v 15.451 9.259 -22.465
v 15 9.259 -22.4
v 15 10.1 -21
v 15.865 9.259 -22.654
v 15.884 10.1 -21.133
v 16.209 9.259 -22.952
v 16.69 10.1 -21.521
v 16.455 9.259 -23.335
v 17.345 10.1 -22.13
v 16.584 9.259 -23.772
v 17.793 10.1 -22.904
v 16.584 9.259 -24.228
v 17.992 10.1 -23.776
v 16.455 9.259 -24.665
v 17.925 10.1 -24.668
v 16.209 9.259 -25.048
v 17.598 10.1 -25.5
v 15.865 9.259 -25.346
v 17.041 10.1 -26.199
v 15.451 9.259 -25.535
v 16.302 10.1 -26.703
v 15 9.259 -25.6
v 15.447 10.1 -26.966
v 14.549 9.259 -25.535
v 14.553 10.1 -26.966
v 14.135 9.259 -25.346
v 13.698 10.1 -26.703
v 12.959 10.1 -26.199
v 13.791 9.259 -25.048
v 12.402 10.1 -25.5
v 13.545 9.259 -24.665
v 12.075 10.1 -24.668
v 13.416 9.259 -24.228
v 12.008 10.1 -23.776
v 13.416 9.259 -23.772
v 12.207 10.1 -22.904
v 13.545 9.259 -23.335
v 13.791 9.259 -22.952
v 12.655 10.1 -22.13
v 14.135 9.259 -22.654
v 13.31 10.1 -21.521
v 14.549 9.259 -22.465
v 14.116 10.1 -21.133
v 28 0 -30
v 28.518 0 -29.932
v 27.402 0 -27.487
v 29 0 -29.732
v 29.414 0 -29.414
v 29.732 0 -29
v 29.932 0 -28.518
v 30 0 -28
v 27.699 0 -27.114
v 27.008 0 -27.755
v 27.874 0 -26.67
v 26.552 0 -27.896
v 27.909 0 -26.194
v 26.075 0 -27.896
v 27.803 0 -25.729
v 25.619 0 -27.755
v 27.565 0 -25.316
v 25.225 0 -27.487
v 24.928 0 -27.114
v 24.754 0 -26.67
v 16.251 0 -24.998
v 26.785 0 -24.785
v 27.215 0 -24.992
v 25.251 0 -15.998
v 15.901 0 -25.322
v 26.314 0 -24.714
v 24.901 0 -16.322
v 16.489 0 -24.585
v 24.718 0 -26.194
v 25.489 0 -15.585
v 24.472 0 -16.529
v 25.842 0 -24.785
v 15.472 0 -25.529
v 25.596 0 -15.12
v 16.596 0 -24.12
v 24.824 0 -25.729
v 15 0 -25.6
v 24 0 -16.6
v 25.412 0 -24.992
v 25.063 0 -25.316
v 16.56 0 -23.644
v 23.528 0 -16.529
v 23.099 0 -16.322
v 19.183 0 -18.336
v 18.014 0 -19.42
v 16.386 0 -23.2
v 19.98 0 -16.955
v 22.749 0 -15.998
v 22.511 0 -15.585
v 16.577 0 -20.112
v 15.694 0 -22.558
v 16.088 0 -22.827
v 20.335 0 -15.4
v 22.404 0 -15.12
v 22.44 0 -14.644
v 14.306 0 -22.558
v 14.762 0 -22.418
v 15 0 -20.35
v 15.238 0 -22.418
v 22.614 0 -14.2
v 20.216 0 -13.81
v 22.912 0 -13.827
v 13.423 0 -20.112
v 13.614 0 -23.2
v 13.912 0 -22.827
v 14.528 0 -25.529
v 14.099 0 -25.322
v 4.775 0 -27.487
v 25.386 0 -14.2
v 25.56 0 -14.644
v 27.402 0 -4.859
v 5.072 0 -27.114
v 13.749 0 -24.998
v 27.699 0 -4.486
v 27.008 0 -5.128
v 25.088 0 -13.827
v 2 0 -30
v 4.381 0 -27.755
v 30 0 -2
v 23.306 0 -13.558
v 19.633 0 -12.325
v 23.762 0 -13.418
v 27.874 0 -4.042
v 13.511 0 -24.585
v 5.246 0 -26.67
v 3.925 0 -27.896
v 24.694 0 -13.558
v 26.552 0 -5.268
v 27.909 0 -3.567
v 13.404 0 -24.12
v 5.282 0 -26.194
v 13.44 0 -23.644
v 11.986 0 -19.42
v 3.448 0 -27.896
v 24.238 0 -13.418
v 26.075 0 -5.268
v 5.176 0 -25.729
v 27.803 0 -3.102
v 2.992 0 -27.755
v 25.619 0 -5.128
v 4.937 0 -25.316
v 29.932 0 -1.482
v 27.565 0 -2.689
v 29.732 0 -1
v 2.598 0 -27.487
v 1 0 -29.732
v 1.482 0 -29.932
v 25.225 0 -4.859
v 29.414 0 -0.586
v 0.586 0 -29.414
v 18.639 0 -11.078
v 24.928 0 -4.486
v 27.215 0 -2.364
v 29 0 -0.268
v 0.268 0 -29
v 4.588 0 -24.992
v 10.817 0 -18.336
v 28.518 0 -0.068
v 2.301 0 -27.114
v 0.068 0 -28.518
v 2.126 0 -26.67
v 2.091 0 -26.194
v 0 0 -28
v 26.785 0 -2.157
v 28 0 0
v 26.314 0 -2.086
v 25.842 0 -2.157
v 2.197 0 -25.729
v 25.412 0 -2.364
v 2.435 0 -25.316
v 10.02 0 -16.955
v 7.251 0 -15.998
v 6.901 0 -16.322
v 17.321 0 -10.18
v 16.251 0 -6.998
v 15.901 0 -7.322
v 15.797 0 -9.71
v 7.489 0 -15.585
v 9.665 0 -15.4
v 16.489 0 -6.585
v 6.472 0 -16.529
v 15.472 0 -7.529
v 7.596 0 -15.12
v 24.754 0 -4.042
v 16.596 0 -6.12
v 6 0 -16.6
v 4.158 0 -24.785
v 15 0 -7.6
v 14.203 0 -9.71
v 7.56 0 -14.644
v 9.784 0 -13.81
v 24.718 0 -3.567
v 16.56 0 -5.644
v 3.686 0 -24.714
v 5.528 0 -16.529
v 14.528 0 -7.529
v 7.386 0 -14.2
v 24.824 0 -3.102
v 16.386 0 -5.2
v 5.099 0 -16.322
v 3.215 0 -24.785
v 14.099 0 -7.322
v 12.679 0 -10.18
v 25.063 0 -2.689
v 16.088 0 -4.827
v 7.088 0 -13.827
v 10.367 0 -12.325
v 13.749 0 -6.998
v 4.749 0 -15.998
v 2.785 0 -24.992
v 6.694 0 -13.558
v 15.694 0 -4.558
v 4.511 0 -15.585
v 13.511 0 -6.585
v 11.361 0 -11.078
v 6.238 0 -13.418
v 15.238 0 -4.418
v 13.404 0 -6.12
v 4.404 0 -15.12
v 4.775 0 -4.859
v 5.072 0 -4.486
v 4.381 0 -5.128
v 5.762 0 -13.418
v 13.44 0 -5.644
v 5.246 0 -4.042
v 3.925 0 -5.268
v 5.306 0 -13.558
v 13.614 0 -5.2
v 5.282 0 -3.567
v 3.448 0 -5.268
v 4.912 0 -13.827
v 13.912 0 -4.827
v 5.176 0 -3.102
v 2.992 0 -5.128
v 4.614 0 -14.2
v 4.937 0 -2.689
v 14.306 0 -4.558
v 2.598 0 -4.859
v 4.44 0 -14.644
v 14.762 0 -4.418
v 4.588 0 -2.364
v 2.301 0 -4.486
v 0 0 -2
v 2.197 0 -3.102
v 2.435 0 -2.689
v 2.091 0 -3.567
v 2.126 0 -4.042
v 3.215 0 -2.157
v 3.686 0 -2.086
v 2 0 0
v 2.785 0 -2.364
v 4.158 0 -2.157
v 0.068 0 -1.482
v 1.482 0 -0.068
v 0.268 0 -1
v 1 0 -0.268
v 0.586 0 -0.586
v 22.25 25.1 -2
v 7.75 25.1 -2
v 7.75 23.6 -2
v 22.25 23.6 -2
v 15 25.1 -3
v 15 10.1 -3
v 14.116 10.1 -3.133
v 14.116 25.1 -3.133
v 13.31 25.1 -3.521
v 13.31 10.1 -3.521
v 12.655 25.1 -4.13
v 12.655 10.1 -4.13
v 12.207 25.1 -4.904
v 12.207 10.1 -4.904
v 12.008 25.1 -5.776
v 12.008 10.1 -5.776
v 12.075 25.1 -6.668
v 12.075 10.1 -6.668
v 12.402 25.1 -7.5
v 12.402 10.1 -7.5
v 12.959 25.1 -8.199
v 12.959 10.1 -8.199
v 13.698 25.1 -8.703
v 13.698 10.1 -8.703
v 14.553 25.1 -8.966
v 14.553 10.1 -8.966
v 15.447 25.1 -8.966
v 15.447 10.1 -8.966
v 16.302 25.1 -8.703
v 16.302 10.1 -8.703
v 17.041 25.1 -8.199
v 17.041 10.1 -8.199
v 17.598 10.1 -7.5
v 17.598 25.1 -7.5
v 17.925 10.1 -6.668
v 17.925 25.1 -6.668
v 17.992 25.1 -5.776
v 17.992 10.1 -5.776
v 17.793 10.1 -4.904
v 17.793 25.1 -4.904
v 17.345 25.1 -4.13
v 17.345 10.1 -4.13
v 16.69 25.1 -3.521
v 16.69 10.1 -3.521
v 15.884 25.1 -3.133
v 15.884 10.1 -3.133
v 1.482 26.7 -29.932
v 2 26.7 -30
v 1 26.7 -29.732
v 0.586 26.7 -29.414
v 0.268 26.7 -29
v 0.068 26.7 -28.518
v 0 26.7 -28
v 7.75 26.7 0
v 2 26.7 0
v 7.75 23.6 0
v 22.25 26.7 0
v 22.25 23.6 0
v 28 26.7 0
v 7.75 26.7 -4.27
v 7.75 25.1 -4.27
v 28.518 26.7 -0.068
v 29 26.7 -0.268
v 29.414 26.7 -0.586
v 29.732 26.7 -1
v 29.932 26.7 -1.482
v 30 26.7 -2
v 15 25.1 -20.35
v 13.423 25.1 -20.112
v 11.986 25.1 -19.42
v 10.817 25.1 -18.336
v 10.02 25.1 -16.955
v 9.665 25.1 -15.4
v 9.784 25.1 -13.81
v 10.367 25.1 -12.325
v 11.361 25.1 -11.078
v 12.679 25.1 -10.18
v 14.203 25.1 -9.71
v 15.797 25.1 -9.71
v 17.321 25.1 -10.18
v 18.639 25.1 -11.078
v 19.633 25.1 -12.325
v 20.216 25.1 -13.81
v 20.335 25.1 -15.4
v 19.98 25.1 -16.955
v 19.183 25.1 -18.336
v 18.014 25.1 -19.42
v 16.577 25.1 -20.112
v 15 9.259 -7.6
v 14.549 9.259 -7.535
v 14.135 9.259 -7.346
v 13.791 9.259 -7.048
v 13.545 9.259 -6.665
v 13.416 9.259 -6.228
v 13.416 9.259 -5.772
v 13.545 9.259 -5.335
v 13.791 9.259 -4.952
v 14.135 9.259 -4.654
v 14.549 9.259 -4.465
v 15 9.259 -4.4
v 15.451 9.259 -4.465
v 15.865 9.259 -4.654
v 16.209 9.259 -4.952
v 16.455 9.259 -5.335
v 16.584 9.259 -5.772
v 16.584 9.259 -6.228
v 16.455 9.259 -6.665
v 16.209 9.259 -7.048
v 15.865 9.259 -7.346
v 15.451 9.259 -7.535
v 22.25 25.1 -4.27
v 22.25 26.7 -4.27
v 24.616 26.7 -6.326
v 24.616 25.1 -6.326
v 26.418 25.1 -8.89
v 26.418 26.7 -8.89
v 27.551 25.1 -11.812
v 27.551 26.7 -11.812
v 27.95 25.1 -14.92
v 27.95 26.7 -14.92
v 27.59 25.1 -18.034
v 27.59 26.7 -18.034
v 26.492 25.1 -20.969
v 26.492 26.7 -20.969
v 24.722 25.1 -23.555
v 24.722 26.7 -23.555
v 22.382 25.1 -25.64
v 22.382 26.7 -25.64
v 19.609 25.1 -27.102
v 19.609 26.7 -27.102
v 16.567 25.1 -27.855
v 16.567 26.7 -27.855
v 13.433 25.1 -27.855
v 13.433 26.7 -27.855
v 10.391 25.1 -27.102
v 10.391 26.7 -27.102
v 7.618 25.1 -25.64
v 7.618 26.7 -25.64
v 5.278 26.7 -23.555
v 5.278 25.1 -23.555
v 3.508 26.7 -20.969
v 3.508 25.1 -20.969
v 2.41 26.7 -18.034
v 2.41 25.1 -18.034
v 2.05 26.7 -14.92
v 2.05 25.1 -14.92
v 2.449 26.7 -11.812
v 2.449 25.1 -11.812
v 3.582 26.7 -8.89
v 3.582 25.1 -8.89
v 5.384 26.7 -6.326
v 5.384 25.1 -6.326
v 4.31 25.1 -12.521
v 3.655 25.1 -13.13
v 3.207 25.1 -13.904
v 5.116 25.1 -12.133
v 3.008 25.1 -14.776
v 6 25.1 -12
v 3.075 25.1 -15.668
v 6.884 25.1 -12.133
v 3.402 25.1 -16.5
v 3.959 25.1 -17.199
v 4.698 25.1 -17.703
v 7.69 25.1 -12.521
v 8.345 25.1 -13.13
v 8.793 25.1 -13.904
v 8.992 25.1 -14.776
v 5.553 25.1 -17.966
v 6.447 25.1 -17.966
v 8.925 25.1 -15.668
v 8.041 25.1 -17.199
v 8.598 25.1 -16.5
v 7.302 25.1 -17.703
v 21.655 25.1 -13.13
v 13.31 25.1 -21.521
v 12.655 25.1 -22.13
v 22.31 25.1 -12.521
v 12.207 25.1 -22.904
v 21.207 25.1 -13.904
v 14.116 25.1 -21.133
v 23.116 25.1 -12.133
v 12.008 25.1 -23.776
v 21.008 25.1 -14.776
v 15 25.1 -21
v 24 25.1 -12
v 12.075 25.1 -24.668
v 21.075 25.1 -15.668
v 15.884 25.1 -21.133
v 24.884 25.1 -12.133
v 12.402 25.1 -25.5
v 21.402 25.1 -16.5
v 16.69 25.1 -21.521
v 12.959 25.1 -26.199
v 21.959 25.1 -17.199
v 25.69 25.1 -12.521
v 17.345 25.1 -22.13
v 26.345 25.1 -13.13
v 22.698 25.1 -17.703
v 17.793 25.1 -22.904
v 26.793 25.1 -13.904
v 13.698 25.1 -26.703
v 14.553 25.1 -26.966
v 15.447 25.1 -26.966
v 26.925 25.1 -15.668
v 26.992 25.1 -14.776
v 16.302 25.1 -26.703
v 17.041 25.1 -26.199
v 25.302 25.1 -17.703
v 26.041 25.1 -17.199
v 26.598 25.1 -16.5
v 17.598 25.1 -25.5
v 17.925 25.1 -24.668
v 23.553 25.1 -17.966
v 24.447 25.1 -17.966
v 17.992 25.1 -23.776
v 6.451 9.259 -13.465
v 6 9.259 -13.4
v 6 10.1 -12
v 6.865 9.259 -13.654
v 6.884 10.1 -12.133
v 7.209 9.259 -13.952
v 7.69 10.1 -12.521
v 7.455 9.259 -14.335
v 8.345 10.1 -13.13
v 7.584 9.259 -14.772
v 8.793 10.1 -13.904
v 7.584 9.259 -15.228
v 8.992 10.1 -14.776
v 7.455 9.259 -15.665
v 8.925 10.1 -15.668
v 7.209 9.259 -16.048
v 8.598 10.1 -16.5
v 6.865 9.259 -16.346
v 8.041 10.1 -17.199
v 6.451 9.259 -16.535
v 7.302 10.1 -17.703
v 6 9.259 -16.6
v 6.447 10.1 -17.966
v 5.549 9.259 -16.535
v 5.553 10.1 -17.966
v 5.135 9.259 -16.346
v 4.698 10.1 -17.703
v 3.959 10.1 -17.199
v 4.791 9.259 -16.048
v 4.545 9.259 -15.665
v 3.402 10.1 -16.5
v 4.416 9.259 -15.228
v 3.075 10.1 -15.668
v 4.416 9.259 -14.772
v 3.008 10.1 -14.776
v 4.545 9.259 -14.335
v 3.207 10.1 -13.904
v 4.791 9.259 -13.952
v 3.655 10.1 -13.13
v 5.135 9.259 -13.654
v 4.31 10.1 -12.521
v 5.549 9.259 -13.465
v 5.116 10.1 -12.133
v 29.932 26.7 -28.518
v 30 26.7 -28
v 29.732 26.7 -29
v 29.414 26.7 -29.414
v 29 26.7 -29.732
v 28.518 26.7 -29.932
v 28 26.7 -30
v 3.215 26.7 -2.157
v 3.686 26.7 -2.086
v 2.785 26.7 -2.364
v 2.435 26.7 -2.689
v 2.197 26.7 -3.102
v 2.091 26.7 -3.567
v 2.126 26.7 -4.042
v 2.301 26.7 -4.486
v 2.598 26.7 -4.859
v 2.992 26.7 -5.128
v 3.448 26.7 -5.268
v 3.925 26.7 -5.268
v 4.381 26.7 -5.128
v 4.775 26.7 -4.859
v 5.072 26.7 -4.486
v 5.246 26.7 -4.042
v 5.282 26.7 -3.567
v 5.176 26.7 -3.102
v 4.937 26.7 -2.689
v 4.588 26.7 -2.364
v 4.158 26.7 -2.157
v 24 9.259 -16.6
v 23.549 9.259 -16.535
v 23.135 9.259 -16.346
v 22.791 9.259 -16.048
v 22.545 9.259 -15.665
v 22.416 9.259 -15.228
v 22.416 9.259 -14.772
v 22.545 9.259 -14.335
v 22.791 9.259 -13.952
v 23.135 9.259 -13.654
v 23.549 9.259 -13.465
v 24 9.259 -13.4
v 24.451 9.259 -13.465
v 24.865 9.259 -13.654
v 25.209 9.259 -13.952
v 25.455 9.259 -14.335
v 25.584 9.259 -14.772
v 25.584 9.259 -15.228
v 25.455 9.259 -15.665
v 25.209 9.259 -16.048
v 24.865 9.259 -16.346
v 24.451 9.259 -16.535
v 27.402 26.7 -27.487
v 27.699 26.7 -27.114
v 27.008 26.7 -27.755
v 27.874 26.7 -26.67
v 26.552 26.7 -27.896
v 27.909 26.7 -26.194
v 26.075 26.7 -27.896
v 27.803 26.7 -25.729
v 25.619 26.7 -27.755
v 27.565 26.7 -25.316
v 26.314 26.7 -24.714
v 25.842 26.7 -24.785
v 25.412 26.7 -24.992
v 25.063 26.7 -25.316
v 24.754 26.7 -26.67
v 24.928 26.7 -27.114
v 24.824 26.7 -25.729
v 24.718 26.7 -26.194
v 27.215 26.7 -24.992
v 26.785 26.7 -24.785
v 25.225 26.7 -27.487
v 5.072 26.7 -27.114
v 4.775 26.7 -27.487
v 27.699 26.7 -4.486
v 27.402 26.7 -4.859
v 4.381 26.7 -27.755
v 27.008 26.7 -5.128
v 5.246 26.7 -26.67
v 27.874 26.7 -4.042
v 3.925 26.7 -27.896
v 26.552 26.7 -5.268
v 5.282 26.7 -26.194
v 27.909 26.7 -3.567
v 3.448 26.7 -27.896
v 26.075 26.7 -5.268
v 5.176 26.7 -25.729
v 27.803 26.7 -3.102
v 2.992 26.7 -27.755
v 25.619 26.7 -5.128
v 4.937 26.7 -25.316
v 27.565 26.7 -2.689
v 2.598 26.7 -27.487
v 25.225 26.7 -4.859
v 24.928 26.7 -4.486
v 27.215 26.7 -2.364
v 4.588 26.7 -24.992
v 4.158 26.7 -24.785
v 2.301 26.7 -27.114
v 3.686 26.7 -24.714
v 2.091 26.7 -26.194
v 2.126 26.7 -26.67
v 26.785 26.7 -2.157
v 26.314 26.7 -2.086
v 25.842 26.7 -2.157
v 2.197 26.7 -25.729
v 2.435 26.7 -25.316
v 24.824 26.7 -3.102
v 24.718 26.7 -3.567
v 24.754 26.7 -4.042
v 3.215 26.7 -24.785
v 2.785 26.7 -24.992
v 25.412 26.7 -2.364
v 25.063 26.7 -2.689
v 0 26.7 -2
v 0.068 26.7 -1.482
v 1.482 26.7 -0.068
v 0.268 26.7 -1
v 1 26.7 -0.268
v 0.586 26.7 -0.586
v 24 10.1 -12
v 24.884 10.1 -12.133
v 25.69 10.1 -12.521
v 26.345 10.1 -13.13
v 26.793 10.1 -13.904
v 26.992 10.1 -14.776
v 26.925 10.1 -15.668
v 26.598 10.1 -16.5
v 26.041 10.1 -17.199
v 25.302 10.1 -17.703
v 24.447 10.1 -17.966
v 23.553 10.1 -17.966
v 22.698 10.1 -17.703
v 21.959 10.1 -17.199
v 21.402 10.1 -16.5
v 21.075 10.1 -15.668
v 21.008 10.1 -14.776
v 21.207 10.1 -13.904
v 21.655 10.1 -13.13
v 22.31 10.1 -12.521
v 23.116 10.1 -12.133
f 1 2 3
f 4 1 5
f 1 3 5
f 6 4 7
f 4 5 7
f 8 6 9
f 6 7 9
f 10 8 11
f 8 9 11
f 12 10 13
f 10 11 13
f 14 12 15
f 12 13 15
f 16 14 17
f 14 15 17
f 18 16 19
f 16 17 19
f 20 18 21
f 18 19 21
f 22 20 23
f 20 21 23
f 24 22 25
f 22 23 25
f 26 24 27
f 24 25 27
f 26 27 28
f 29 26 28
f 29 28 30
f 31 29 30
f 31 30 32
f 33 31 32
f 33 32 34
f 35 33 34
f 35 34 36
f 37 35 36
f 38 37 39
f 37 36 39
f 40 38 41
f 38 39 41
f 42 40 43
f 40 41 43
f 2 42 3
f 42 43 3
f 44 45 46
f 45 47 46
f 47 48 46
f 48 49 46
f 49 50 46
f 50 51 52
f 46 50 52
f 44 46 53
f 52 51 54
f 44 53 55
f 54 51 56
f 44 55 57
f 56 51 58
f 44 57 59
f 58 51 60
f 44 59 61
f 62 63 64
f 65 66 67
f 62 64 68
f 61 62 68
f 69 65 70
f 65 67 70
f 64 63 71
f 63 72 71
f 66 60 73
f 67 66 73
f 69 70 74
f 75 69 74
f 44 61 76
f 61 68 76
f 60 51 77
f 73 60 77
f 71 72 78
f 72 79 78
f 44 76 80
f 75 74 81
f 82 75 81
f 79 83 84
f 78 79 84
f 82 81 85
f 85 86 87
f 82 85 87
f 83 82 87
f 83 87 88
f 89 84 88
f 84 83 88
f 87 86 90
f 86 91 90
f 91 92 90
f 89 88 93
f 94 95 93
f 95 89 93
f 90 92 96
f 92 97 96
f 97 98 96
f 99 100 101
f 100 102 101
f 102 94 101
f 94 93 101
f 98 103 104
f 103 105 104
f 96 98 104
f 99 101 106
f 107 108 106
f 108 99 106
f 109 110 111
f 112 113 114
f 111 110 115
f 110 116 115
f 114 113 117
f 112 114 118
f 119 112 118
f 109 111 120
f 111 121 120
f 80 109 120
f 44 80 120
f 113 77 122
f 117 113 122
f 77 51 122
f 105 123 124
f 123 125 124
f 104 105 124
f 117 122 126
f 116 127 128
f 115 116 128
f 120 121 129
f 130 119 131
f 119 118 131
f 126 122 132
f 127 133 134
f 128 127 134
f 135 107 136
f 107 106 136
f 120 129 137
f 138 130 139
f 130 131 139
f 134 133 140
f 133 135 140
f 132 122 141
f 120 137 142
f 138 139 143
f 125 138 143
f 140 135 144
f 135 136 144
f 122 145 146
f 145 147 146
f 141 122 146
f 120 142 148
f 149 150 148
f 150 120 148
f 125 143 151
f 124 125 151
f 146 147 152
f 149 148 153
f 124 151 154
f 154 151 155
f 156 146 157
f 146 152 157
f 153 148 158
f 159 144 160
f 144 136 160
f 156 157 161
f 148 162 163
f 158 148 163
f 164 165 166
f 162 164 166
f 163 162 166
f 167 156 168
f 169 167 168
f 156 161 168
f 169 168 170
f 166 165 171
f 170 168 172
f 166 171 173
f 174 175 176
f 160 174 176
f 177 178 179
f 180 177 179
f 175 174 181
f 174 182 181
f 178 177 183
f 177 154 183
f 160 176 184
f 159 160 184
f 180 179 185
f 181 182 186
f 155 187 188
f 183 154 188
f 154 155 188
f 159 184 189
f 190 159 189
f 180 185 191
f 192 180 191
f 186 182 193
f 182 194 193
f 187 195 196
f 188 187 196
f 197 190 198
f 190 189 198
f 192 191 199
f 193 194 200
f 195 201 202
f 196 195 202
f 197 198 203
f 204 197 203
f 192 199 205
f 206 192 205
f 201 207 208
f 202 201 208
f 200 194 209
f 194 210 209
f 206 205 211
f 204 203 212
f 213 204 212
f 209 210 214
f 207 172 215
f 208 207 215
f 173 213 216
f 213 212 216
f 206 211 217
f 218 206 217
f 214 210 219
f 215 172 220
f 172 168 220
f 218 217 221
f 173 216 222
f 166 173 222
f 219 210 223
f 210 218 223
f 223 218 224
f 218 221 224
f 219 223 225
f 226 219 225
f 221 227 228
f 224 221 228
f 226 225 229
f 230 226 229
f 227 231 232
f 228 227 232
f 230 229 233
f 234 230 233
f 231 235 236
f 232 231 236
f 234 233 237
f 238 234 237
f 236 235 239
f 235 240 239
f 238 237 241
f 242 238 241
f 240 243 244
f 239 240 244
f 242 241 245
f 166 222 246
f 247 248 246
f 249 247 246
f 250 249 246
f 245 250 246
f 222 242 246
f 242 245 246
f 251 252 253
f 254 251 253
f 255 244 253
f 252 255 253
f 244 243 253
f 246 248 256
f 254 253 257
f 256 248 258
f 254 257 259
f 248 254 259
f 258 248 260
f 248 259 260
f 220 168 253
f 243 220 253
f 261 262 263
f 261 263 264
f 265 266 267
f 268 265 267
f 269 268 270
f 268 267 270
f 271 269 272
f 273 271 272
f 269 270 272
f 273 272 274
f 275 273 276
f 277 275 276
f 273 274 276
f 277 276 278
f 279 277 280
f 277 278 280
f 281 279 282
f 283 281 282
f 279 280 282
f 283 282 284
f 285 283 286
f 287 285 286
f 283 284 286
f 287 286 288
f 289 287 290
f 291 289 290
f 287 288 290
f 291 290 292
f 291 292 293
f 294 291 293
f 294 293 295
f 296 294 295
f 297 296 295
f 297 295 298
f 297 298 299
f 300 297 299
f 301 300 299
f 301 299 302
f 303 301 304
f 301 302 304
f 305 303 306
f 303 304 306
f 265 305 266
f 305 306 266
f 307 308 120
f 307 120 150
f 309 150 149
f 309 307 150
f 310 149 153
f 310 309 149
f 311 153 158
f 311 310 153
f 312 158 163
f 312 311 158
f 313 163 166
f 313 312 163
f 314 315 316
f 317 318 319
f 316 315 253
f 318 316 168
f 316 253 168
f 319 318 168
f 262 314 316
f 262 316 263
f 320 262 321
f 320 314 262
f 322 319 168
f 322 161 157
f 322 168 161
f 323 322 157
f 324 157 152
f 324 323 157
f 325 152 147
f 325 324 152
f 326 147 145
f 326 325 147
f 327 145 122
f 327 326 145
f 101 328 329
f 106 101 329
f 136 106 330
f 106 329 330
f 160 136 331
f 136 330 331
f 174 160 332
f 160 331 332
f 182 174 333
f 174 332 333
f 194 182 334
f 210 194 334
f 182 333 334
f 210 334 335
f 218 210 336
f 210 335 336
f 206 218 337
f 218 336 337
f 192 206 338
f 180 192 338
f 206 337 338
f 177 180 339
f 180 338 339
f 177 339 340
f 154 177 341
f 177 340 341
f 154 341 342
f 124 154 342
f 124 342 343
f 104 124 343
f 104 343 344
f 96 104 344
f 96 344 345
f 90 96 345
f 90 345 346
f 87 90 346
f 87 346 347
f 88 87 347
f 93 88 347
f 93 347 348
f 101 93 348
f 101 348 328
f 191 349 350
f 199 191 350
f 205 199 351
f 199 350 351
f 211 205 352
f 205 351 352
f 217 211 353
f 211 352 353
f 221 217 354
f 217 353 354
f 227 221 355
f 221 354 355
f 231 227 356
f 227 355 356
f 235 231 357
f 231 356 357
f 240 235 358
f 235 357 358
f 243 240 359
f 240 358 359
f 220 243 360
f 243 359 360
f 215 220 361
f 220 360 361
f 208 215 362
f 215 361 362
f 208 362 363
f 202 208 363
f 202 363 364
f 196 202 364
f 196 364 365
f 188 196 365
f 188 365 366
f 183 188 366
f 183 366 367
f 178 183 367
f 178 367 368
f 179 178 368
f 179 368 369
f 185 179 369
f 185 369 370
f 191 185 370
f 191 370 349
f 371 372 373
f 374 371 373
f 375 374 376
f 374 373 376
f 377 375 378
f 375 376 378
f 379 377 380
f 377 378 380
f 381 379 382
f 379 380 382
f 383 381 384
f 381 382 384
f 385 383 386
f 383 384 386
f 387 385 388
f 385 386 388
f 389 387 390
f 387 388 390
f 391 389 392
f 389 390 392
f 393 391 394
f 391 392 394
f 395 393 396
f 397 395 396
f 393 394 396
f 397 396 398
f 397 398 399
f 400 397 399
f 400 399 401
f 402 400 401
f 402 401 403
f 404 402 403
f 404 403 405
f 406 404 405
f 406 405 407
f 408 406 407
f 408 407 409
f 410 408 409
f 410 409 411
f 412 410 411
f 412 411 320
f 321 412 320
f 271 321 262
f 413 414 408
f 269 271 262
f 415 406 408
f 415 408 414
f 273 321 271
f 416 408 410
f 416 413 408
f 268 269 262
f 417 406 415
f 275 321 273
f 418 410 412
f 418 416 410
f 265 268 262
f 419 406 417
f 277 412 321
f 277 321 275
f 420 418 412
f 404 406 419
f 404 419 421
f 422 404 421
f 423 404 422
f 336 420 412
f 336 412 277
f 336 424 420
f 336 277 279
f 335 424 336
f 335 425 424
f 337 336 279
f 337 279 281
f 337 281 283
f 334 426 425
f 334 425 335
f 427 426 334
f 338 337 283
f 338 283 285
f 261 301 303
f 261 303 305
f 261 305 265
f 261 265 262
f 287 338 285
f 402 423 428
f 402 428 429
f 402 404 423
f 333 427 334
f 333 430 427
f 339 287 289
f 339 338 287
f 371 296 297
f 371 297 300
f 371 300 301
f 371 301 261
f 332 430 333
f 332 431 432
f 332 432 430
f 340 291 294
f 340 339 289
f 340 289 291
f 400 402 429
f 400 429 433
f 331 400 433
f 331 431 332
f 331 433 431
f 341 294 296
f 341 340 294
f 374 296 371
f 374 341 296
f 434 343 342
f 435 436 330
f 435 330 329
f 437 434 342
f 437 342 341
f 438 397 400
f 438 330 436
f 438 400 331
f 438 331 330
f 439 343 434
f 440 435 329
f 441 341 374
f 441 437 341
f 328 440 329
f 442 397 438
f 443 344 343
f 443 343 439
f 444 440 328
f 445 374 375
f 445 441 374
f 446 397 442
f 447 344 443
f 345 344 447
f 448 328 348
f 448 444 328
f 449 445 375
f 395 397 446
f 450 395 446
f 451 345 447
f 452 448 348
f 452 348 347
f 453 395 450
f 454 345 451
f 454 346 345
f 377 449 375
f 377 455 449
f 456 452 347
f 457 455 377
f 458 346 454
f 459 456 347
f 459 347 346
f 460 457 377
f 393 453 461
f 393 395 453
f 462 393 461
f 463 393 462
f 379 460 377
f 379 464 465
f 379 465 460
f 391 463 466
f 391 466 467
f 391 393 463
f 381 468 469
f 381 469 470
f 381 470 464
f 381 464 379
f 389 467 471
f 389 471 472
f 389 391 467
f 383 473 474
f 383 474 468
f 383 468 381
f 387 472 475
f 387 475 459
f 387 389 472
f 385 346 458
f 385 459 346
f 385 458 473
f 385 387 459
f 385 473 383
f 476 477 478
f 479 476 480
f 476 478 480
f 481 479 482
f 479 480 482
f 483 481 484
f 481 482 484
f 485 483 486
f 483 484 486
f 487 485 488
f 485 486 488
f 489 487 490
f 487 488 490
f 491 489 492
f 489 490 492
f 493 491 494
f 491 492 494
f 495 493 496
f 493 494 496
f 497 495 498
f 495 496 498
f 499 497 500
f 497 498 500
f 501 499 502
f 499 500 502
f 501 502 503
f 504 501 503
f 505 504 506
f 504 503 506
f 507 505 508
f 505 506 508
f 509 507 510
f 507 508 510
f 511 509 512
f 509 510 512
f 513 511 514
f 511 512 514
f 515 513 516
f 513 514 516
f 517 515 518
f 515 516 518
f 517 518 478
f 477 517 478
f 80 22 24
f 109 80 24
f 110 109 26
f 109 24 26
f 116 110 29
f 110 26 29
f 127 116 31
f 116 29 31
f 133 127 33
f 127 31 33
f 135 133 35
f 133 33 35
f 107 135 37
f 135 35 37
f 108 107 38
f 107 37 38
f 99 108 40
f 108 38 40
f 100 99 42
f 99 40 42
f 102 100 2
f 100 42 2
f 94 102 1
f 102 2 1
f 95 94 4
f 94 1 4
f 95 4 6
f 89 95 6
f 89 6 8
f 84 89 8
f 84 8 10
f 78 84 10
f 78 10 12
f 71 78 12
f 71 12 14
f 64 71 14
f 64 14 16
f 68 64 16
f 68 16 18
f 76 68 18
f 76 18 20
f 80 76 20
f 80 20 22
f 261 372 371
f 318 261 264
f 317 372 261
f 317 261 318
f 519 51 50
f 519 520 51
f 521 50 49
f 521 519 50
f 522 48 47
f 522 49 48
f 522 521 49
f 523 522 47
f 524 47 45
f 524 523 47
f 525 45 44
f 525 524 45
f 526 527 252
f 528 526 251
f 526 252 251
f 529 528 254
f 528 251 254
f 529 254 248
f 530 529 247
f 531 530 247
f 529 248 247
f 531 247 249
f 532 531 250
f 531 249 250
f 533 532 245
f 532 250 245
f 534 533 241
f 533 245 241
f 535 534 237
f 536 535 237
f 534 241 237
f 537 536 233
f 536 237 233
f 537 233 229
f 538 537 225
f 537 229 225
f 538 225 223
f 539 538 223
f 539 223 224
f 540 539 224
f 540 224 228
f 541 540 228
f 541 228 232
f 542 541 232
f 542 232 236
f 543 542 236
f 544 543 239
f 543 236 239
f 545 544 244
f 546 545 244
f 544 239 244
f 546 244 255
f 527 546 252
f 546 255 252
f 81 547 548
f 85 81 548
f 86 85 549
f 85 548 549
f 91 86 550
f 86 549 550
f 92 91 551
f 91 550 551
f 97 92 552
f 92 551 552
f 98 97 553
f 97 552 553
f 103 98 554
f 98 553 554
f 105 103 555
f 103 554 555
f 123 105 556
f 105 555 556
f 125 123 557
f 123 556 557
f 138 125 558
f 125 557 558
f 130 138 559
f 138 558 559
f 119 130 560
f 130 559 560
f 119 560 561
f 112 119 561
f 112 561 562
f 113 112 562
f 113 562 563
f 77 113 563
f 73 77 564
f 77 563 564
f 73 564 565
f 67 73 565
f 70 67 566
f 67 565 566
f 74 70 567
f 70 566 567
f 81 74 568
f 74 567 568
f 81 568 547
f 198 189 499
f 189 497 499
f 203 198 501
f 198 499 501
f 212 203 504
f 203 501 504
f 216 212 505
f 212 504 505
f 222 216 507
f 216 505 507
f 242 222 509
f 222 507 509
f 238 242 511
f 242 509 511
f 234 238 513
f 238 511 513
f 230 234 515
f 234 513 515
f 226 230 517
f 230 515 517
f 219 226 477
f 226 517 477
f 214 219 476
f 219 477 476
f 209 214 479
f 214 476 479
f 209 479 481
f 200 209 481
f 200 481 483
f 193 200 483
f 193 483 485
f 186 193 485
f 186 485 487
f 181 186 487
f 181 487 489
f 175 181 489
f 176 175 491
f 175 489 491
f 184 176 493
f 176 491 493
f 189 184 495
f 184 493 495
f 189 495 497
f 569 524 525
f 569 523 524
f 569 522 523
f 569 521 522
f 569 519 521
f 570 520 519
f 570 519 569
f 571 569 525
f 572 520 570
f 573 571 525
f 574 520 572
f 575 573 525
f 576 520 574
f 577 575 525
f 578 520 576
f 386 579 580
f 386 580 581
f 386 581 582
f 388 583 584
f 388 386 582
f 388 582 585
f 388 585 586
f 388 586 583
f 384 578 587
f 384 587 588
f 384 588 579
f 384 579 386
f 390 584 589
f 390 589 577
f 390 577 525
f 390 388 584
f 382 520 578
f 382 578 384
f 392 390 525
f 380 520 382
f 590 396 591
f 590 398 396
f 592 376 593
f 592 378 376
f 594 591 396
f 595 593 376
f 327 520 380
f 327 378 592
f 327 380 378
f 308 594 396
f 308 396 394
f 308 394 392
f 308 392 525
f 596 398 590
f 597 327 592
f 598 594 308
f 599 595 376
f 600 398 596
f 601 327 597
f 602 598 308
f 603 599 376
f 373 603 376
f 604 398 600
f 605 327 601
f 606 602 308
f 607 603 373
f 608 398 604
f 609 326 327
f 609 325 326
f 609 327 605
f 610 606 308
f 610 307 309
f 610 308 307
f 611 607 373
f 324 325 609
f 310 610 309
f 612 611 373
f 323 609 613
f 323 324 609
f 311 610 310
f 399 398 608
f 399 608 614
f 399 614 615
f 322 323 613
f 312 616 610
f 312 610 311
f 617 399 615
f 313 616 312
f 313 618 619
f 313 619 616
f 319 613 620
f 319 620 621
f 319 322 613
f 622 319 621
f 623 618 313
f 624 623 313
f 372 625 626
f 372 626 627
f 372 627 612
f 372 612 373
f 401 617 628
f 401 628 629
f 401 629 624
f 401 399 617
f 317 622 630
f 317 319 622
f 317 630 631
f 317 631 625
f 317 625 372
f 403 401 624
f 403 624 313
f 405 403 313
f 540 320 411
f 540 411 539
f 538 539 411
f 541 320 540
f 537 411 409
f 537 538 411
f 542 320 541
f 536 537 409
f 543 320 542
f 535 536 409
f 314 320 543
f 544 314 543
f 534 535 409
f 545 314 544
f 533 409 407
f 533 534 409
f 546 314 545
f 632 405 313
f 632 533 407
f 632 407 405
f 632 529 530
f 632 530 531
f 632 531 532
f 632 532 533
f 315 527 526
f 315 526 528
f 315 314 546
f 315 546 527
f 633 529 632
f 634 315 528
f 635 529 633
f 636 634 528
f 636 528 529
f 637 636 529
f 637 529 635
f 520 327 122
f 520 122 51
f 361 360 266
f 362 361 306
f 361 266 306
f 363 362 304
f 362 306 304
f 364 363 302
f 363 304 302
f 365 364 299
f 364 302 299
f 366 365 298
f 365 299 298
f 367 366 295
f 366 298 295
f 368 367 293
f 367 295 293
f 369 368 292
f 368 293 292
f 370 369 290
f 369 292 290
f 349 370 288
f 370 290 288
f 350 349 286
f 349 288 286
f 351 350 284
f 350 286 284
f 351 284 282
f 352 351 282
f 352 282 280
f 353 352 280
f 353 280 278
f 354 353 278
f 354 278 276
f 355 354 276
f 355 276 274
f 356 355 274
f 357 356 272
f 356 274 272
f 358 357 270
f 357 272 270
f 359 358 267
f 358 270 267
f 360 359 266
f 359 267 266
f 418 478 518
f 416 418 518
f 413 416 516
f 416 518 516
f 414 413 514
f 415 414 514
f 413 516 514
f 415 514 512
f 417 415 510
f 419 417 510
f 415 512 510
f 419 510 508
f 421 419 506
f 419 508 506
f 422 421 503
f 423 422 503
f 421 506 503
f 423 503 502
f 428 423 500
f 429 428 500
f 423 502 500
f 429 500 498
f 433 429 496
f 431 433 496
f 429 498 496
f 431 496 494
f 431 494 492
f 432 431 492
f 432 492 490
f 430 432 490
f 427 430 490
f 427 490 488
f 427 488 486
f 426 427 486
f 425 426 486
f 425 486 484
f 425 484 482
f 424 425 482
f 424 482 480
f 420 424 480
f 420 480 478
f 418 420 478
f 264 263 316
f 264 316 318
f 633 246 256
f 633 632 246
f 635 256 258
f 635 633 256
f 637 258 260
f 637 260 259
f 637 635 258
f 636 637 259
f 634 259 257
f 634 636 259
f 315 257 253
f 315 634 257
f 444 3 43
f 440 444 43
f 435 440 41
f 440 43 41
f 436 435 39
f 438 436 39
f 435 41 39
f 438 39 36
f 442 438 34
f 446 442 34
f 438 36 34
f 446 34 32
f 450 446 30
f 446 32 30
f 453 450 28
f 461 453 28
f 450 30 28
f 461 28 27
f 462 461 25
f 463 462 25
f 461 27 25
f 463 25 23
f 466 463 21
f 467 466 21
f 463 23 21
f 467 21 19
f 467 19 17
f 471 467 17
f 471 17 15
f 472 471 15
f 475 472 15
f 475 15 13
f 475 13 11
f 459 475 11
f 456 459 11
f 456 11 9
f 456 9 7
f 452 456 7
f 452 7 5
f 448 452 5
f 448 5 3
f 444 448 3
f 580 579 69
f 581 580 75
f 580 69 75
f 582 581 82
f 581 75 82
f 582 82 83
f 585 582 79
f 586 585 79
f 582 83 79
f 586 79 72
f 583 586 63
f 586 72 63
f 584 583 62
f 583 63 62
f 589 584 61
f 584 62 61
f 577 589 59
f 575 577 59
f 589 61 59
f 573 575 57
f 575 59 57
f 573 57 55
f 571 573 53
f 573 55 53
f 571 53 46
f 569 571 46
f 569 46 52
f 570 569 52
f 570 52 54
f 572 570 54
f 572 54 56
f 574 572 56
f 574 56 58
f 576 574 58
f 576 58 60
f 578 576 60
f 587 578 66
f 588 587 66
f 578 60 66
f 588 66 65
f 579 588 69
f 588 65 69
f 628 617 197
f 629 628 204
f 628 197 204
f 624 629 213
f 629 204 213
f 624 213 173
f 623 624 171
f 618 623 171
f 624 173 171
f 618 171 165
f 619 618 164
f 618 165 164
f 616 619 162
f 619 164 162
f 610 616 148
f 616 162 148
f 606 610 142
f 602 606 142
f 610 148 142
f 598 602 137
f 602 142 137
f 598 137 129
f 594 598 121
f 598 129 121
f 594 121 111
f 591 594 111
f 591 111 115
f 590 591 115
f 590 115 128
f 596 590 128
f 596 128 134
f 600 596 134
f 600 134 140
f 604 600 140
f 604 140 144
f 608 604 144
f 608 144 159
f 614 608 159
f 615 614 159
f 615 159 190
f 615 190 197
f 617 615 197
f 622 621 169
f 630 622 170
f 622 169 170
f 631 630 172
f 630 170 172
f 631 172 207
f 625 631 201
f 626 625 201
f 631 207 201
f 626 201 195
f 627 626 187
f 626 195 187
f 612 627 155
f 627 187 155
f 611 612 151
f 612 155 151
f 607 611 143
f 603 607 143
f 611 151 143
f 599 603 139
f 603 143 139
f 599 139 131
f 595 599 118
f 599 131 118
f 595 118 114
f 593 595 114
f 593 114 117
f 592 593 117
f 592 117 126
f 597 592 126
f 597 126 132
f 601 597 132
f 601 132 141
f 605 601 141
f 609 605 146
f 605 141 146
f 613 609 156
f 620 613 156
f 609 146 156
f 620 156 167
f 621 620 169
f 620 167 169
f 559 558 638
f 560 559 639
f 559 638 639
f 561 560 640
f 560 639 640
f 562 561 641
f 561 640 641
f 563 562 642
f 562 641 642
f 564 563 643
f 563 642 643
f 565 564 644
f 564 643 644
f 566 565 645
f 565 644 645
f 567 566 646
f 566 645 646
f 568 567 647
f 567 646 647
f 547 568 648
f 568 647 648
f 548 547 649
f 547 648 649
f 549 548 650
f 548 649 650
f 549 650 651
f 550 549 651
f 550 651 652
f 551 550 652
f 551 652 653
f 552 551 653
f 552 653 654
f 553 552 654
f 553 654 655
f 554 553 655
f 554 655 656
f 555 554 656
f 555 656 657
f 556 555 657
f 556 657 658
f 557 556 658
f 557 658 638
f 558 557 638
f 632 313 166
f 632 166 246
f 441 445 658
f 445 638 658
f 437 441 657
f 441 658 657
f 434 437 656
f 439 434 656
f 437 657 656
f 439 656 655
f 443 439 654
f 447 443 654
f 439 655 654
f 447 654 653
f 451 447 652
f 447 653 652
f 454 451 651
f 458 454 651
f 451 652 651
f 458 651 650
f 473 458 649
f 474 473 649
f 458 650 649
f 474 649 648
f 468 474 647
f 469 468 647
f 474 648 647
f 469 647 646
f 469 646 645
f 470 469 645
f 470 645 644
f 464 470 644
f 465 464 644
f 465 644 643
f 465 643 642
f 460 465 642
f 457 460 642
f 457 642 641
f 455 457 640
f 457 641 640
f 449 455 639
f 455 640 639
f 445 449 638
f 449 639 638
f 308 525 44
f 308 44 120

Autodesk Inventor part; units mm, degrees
ref_plane "YZ Plane" through (0, 0, 0) normal (1, 0, 0) x (0, 1, 0)
ref_plane "XZ Plane" through (0, 0, 0) normal (0, 1, 0) x (-1, 0, 0)
ref_plane "XY Plane" through (0, 0, 0) normal (0, 0, 1) x (1, 0, 0)
sketch "スケッチ4" plane through (0, 0, 0) normal (0, 1, 0) x (-1, 0, 0)
  line L0 (0, 0) -> (-30, 0)
  line L1 (-30, 0) -> (-30, -30)
  line L2 (-30, -30) -> (0, -30)
  line L3 (0, -30) -> (0, 0)
  dimension "d6" = 30
  dimension "d7" = 30
extrude "押し出し2" add sketch "スケッチ4" along normal blind 26.7
sketch "スケッチ5" plane through (0, 26.7, 0) normal (0, 1, 0) x (1, 0, 0)
  circle A0 centre (15, 15) radius 12.95
  line L0 (0, 30) -> (0, 0) projected
  line L1 (30, 30) -> (0, 30) projected
  line L2 (7.75, 4.2697) -> (22.25, 4.2697)
  line L3 (22.25, 4.2697) -> (22.25, -0.093)
  line L4 (22.25, -0.093) -> (7.75, -0.093)
  line L5 (7.75, -0.093) -> (7.75, 4.2697)
  point P0 (0, 15)
  point P1 (15, 30)
  point P2 (7.75, 2.0883)
  point P3 (22.25, 4.2697)
  dimension "d10" = 25.9
  dimension "d28" = 14.5
  dimension "d29" = 7.25
sketch "スケッチ6" plane through (0, 26.7, 0) normal (0, 1, 0) x (1, 0, 0)
  circle A0 centre (15, 15) radius 12.95 projected
  line L0 (30, 0) -> (30, 30) construction
  line L1 (30, 30) -> (0, 30) construction
  line L2 (0, 0) -> (30, 0) construction
  circle A1 centre (24.5802, 2.4198) radius 0 construction
  circle A2 centre (15, 15) radius 16 construction
  line L3 (30, 0) -> (0, 30) construction
  line L4 (0, 30) -> (0, 0) construction
  line L5 (0, 0) -> (30, 30) construction
  point P0 (24.5802, 2.4198)
  point P1 (3.6863, 3.6863)
  point P2 (3.6863, 26.3137)
  point P3 (26.3137, 26.3137)
  point P4 (26.3137, 3.6863)
  dimension "d61" = 32
fillet "フィレット1" radius 2 4 edges at (0, 13.35, -30) (0, 13.35, 0) (30, 13.35, 0) (30, 13.35, -30)
extrude "押し出し3" cut sketch "スケッチ5" against normal blind 1.6
sketch "スケッチ7" plane through (0, 0, 0) normal (0, -1, 0) x (1, 0, 0)
  line L0 (0, -28) -> (0, -2) projected
  line L1 (28, -30) -> (2, -30) projected
  point P0 (0, 0)
  point P1 (15, -15)
  point P2 (0, -15)
  point P3 (15, -30)
hole "穴3" at (15, 0, -15) direction (0, 1, 0) diameter 10.7 end through all
sketch "スケッチ8" plane through (0, 0, 0) normal (0, -1, 0) x (1, 0, 0)
  line L0 (0, -28) -> (0, -2) projected
  line L1 (28, -30) -> (2, -30) projected
  circle A0 centre (15, -15) radius 9
  point P0 (0, 0)
  point P1 (0, -15)
  point P2 (15, -30)
  point P3 (15, -24)
  point P4 (6, -15)
  point P5 (15, -6)
  point P6 (24, -15)
  dimension "d39" = 18
hole "穴4" at (15, 0, -15) at (15, 0, -24) at (6, 0, -15) at (15, 0, -6) at (24, 0, -15) direction (0, 1, 0) diameter 3.2 end through all
sketch "スケッチ9" plane through (0, 25.1, 0) normal (0, 1, 0) x (1, 0, 0)
  circle A0 centre (15, 6) radius 1.6 projected
  circle A1 centre (6, 15) radius 1.6 projected
  circle A2 centre (15, 24) radius 1.6 projected
  circle A3 centre (24, 15) radius 1.6 projected
  point P0 (0, 0)
hole "穴5" at (15, 25.1, -6) at (6, 25.1, -15) at (15, 25.1, -24) at (24, 25.1, -15) direction (0, -1, 0) diameter 6 depth 15 tip angle 118
sketch "スケッチ10" plane through (0, 26.7, 0) normal (0, 1, 0) x (1, 0, 0)
  circle A0 centre (24.5802, 2.4198) radius 1.1 projected
  circle A1 centre (2.4198, 2.4198) radius 1.1 projected
  circle A2 centre (2.4198, 24.5802) radius 1.1 projected
  circle A3 centre (24.5802, 24.5802) radius 1.1 projected
  point P0 (0, 0)
hole "穴6" [suppressed]
hole "穴7" at (3.6863, 26.7, -3.6863) at (3.6863, 26.7, -26.3137) at (26.3137, 26.7, -26.3137) at (26.3137, 26.7, -3.6863) direction (0, -1, 0) diameter 3.2 end through all
sketch "スケッチ11" plane through (0, 25.1, 0) normal (0, 1, 0) x (1, 0, 0)
  line L0 (7.75, 0) -> (7.75, 4.2697) projected
  line L1 (22.25, 0) -> (7.75, 0)
  line L2 (7.75, 0) -> (7.75, 2)
  line L3 (7.75, 2) -> (22.25, 2)
  line L4 (22.25, 2) -> (22.25, 0)
  dimension "d72" = 2
extrude "押し出し5" cut sketch "スケッチ11" against normal blind 1.5
properties part number "NewPart1_ver6"
